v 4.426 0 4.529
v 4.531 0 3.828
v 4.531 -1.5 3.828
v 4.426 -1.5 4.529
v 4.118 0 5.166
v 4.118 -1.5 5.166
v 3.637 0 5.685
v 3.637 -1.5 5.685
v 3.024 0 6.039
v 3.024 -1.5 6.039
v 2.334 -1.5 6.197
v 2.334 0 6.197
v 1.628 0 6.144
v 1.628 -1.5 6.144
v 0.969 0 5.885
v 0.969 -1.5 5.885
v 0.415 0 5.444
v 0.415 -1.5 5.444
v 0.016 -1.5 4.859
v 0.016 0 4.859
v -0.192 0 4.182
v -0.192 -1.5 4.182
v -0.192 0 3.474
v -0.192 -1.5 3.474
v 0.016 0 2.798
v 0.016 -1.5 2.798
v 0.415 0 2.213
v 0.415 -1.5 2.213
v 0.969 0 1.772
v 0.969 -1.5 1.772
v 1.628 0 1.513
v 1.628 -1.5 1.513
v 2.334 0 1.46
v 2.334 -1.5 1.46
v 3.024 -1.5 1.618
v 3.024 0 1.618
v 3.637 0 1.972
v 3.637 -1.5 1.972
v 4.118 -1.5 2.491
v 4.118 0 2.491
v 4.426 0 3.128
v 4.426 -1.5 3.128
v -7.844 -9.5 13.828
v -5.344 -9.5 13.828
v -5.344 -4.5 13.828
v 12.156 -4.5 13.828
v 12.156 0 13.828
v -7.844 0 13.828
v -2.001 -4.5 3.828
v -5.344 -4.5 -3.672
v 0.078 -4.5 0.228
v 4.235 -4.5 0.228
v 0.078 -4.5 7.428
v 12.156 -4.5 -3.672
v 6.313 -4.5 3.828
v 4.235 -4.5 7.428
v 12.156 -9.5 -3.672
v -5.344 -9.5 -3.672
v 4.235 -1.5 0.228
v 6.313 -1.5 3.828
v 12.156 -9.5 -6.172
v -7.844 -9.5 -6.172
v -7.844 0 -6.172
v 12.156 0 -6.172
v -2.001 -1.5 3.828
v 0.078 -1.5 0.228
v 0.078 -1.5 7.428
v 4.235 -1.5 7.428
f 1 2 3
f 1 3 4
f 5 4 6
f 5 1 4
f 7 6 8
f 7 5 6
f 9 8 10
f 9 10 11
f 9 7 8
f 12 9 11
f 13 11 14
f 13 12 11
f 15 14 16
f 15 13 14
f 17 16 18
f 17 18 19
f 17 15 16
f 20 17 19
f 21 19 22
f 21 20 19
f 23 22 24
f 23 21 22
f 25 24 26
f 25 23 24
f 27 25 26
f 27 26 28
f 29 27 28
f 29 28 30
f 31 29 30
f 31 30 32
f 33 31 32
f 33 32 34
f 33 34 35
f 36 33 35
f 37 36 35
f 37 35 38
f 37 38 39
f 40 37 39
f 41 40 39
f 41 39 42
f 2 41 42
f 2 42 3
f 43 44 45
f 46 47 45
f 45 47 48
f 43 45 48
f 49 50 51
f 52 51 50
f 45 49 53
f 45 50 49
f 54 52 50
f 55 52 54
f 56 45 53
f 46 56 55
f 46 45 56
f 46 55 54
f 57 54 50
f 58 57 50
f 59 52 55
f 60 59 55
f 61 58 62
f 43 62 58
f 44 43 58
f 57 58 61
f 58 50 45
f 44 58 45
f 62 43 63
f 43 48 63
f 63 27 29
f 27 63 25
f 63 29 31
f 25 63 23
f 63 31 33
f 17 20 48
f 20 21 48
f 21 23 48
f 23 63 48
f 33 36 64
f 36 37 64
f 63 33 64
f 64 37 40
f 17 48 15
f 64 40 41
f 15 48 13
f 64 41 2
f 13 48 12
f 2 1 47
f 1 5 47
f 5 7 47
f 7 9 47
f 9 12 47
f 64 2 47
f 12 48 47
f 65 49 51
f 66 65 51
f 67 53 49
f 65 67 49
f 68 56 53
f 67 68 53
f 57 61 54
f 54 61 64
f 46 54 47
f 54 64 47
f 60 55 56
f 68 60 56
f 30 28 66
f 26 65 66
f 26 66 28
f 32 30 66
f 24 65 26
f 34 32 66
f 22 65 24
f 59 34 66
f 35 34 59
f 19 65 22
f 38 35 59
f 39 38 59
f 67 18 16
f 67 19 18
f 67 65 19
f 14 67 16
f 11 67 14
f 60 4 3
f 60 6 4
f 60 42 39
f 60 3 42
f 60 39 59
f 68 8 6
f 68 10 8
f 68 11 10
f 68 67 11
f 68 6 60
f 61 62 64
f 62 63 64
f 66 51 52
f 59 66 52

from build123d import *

# Parameters (mm, degrees)
F0_W     = 20
F0_H     = 20
F0_R     = 2.375
F1_DEPTH = 4.5
F3_DEPTH = 5
F4_R     = 2.375
F5_DEPTH = 3


with BuildPart() as f1:
    # F0 (on Front) → F1 (new body)
    with BuildSketch(Plane.XZ):
        with Locations((2.156144, 3.828467)):
            Rectangle(F0_W, F0_H)
        with Locations((2.156144, 3.828467)):
            Circle(F0_R, mode=Mode.SUBTRACT)
    extrude(amount=F1_DEPTH)

    # F2 (on face) → F3 (join)
    with BuildSketch(Plane.XZ.offset(4.5)):
        Polygon((-5.343856, 13.828467), (-7.843856, 13.828467), (-7.843856, -6.171533), (12.156144, -6.171533), (12.156144, -3.671533), (-5.343856, -3.671533), align=None)
    extrude(amount=F3_DEPTH)

    # F4 (on face) → F5 (cut)
    with BuildSketch(Plane.XZ.offset(4.5)):
        Polygon((0.077683, 7.428467), (-2.000778, 3.828467), (0.077683, 0.228467), (4.234605, 0.228467), (6.313066, 3.828467), (4.234605, 7.428467), align=None)
        with Locations((2.156144, 3.828467)):
            Circle(F4_R, mode=Mode.SUBTRACT)
    extrude(amount=-F5_DEPTH, mode=Mode.SUBTRACT)


solid = f1.part
